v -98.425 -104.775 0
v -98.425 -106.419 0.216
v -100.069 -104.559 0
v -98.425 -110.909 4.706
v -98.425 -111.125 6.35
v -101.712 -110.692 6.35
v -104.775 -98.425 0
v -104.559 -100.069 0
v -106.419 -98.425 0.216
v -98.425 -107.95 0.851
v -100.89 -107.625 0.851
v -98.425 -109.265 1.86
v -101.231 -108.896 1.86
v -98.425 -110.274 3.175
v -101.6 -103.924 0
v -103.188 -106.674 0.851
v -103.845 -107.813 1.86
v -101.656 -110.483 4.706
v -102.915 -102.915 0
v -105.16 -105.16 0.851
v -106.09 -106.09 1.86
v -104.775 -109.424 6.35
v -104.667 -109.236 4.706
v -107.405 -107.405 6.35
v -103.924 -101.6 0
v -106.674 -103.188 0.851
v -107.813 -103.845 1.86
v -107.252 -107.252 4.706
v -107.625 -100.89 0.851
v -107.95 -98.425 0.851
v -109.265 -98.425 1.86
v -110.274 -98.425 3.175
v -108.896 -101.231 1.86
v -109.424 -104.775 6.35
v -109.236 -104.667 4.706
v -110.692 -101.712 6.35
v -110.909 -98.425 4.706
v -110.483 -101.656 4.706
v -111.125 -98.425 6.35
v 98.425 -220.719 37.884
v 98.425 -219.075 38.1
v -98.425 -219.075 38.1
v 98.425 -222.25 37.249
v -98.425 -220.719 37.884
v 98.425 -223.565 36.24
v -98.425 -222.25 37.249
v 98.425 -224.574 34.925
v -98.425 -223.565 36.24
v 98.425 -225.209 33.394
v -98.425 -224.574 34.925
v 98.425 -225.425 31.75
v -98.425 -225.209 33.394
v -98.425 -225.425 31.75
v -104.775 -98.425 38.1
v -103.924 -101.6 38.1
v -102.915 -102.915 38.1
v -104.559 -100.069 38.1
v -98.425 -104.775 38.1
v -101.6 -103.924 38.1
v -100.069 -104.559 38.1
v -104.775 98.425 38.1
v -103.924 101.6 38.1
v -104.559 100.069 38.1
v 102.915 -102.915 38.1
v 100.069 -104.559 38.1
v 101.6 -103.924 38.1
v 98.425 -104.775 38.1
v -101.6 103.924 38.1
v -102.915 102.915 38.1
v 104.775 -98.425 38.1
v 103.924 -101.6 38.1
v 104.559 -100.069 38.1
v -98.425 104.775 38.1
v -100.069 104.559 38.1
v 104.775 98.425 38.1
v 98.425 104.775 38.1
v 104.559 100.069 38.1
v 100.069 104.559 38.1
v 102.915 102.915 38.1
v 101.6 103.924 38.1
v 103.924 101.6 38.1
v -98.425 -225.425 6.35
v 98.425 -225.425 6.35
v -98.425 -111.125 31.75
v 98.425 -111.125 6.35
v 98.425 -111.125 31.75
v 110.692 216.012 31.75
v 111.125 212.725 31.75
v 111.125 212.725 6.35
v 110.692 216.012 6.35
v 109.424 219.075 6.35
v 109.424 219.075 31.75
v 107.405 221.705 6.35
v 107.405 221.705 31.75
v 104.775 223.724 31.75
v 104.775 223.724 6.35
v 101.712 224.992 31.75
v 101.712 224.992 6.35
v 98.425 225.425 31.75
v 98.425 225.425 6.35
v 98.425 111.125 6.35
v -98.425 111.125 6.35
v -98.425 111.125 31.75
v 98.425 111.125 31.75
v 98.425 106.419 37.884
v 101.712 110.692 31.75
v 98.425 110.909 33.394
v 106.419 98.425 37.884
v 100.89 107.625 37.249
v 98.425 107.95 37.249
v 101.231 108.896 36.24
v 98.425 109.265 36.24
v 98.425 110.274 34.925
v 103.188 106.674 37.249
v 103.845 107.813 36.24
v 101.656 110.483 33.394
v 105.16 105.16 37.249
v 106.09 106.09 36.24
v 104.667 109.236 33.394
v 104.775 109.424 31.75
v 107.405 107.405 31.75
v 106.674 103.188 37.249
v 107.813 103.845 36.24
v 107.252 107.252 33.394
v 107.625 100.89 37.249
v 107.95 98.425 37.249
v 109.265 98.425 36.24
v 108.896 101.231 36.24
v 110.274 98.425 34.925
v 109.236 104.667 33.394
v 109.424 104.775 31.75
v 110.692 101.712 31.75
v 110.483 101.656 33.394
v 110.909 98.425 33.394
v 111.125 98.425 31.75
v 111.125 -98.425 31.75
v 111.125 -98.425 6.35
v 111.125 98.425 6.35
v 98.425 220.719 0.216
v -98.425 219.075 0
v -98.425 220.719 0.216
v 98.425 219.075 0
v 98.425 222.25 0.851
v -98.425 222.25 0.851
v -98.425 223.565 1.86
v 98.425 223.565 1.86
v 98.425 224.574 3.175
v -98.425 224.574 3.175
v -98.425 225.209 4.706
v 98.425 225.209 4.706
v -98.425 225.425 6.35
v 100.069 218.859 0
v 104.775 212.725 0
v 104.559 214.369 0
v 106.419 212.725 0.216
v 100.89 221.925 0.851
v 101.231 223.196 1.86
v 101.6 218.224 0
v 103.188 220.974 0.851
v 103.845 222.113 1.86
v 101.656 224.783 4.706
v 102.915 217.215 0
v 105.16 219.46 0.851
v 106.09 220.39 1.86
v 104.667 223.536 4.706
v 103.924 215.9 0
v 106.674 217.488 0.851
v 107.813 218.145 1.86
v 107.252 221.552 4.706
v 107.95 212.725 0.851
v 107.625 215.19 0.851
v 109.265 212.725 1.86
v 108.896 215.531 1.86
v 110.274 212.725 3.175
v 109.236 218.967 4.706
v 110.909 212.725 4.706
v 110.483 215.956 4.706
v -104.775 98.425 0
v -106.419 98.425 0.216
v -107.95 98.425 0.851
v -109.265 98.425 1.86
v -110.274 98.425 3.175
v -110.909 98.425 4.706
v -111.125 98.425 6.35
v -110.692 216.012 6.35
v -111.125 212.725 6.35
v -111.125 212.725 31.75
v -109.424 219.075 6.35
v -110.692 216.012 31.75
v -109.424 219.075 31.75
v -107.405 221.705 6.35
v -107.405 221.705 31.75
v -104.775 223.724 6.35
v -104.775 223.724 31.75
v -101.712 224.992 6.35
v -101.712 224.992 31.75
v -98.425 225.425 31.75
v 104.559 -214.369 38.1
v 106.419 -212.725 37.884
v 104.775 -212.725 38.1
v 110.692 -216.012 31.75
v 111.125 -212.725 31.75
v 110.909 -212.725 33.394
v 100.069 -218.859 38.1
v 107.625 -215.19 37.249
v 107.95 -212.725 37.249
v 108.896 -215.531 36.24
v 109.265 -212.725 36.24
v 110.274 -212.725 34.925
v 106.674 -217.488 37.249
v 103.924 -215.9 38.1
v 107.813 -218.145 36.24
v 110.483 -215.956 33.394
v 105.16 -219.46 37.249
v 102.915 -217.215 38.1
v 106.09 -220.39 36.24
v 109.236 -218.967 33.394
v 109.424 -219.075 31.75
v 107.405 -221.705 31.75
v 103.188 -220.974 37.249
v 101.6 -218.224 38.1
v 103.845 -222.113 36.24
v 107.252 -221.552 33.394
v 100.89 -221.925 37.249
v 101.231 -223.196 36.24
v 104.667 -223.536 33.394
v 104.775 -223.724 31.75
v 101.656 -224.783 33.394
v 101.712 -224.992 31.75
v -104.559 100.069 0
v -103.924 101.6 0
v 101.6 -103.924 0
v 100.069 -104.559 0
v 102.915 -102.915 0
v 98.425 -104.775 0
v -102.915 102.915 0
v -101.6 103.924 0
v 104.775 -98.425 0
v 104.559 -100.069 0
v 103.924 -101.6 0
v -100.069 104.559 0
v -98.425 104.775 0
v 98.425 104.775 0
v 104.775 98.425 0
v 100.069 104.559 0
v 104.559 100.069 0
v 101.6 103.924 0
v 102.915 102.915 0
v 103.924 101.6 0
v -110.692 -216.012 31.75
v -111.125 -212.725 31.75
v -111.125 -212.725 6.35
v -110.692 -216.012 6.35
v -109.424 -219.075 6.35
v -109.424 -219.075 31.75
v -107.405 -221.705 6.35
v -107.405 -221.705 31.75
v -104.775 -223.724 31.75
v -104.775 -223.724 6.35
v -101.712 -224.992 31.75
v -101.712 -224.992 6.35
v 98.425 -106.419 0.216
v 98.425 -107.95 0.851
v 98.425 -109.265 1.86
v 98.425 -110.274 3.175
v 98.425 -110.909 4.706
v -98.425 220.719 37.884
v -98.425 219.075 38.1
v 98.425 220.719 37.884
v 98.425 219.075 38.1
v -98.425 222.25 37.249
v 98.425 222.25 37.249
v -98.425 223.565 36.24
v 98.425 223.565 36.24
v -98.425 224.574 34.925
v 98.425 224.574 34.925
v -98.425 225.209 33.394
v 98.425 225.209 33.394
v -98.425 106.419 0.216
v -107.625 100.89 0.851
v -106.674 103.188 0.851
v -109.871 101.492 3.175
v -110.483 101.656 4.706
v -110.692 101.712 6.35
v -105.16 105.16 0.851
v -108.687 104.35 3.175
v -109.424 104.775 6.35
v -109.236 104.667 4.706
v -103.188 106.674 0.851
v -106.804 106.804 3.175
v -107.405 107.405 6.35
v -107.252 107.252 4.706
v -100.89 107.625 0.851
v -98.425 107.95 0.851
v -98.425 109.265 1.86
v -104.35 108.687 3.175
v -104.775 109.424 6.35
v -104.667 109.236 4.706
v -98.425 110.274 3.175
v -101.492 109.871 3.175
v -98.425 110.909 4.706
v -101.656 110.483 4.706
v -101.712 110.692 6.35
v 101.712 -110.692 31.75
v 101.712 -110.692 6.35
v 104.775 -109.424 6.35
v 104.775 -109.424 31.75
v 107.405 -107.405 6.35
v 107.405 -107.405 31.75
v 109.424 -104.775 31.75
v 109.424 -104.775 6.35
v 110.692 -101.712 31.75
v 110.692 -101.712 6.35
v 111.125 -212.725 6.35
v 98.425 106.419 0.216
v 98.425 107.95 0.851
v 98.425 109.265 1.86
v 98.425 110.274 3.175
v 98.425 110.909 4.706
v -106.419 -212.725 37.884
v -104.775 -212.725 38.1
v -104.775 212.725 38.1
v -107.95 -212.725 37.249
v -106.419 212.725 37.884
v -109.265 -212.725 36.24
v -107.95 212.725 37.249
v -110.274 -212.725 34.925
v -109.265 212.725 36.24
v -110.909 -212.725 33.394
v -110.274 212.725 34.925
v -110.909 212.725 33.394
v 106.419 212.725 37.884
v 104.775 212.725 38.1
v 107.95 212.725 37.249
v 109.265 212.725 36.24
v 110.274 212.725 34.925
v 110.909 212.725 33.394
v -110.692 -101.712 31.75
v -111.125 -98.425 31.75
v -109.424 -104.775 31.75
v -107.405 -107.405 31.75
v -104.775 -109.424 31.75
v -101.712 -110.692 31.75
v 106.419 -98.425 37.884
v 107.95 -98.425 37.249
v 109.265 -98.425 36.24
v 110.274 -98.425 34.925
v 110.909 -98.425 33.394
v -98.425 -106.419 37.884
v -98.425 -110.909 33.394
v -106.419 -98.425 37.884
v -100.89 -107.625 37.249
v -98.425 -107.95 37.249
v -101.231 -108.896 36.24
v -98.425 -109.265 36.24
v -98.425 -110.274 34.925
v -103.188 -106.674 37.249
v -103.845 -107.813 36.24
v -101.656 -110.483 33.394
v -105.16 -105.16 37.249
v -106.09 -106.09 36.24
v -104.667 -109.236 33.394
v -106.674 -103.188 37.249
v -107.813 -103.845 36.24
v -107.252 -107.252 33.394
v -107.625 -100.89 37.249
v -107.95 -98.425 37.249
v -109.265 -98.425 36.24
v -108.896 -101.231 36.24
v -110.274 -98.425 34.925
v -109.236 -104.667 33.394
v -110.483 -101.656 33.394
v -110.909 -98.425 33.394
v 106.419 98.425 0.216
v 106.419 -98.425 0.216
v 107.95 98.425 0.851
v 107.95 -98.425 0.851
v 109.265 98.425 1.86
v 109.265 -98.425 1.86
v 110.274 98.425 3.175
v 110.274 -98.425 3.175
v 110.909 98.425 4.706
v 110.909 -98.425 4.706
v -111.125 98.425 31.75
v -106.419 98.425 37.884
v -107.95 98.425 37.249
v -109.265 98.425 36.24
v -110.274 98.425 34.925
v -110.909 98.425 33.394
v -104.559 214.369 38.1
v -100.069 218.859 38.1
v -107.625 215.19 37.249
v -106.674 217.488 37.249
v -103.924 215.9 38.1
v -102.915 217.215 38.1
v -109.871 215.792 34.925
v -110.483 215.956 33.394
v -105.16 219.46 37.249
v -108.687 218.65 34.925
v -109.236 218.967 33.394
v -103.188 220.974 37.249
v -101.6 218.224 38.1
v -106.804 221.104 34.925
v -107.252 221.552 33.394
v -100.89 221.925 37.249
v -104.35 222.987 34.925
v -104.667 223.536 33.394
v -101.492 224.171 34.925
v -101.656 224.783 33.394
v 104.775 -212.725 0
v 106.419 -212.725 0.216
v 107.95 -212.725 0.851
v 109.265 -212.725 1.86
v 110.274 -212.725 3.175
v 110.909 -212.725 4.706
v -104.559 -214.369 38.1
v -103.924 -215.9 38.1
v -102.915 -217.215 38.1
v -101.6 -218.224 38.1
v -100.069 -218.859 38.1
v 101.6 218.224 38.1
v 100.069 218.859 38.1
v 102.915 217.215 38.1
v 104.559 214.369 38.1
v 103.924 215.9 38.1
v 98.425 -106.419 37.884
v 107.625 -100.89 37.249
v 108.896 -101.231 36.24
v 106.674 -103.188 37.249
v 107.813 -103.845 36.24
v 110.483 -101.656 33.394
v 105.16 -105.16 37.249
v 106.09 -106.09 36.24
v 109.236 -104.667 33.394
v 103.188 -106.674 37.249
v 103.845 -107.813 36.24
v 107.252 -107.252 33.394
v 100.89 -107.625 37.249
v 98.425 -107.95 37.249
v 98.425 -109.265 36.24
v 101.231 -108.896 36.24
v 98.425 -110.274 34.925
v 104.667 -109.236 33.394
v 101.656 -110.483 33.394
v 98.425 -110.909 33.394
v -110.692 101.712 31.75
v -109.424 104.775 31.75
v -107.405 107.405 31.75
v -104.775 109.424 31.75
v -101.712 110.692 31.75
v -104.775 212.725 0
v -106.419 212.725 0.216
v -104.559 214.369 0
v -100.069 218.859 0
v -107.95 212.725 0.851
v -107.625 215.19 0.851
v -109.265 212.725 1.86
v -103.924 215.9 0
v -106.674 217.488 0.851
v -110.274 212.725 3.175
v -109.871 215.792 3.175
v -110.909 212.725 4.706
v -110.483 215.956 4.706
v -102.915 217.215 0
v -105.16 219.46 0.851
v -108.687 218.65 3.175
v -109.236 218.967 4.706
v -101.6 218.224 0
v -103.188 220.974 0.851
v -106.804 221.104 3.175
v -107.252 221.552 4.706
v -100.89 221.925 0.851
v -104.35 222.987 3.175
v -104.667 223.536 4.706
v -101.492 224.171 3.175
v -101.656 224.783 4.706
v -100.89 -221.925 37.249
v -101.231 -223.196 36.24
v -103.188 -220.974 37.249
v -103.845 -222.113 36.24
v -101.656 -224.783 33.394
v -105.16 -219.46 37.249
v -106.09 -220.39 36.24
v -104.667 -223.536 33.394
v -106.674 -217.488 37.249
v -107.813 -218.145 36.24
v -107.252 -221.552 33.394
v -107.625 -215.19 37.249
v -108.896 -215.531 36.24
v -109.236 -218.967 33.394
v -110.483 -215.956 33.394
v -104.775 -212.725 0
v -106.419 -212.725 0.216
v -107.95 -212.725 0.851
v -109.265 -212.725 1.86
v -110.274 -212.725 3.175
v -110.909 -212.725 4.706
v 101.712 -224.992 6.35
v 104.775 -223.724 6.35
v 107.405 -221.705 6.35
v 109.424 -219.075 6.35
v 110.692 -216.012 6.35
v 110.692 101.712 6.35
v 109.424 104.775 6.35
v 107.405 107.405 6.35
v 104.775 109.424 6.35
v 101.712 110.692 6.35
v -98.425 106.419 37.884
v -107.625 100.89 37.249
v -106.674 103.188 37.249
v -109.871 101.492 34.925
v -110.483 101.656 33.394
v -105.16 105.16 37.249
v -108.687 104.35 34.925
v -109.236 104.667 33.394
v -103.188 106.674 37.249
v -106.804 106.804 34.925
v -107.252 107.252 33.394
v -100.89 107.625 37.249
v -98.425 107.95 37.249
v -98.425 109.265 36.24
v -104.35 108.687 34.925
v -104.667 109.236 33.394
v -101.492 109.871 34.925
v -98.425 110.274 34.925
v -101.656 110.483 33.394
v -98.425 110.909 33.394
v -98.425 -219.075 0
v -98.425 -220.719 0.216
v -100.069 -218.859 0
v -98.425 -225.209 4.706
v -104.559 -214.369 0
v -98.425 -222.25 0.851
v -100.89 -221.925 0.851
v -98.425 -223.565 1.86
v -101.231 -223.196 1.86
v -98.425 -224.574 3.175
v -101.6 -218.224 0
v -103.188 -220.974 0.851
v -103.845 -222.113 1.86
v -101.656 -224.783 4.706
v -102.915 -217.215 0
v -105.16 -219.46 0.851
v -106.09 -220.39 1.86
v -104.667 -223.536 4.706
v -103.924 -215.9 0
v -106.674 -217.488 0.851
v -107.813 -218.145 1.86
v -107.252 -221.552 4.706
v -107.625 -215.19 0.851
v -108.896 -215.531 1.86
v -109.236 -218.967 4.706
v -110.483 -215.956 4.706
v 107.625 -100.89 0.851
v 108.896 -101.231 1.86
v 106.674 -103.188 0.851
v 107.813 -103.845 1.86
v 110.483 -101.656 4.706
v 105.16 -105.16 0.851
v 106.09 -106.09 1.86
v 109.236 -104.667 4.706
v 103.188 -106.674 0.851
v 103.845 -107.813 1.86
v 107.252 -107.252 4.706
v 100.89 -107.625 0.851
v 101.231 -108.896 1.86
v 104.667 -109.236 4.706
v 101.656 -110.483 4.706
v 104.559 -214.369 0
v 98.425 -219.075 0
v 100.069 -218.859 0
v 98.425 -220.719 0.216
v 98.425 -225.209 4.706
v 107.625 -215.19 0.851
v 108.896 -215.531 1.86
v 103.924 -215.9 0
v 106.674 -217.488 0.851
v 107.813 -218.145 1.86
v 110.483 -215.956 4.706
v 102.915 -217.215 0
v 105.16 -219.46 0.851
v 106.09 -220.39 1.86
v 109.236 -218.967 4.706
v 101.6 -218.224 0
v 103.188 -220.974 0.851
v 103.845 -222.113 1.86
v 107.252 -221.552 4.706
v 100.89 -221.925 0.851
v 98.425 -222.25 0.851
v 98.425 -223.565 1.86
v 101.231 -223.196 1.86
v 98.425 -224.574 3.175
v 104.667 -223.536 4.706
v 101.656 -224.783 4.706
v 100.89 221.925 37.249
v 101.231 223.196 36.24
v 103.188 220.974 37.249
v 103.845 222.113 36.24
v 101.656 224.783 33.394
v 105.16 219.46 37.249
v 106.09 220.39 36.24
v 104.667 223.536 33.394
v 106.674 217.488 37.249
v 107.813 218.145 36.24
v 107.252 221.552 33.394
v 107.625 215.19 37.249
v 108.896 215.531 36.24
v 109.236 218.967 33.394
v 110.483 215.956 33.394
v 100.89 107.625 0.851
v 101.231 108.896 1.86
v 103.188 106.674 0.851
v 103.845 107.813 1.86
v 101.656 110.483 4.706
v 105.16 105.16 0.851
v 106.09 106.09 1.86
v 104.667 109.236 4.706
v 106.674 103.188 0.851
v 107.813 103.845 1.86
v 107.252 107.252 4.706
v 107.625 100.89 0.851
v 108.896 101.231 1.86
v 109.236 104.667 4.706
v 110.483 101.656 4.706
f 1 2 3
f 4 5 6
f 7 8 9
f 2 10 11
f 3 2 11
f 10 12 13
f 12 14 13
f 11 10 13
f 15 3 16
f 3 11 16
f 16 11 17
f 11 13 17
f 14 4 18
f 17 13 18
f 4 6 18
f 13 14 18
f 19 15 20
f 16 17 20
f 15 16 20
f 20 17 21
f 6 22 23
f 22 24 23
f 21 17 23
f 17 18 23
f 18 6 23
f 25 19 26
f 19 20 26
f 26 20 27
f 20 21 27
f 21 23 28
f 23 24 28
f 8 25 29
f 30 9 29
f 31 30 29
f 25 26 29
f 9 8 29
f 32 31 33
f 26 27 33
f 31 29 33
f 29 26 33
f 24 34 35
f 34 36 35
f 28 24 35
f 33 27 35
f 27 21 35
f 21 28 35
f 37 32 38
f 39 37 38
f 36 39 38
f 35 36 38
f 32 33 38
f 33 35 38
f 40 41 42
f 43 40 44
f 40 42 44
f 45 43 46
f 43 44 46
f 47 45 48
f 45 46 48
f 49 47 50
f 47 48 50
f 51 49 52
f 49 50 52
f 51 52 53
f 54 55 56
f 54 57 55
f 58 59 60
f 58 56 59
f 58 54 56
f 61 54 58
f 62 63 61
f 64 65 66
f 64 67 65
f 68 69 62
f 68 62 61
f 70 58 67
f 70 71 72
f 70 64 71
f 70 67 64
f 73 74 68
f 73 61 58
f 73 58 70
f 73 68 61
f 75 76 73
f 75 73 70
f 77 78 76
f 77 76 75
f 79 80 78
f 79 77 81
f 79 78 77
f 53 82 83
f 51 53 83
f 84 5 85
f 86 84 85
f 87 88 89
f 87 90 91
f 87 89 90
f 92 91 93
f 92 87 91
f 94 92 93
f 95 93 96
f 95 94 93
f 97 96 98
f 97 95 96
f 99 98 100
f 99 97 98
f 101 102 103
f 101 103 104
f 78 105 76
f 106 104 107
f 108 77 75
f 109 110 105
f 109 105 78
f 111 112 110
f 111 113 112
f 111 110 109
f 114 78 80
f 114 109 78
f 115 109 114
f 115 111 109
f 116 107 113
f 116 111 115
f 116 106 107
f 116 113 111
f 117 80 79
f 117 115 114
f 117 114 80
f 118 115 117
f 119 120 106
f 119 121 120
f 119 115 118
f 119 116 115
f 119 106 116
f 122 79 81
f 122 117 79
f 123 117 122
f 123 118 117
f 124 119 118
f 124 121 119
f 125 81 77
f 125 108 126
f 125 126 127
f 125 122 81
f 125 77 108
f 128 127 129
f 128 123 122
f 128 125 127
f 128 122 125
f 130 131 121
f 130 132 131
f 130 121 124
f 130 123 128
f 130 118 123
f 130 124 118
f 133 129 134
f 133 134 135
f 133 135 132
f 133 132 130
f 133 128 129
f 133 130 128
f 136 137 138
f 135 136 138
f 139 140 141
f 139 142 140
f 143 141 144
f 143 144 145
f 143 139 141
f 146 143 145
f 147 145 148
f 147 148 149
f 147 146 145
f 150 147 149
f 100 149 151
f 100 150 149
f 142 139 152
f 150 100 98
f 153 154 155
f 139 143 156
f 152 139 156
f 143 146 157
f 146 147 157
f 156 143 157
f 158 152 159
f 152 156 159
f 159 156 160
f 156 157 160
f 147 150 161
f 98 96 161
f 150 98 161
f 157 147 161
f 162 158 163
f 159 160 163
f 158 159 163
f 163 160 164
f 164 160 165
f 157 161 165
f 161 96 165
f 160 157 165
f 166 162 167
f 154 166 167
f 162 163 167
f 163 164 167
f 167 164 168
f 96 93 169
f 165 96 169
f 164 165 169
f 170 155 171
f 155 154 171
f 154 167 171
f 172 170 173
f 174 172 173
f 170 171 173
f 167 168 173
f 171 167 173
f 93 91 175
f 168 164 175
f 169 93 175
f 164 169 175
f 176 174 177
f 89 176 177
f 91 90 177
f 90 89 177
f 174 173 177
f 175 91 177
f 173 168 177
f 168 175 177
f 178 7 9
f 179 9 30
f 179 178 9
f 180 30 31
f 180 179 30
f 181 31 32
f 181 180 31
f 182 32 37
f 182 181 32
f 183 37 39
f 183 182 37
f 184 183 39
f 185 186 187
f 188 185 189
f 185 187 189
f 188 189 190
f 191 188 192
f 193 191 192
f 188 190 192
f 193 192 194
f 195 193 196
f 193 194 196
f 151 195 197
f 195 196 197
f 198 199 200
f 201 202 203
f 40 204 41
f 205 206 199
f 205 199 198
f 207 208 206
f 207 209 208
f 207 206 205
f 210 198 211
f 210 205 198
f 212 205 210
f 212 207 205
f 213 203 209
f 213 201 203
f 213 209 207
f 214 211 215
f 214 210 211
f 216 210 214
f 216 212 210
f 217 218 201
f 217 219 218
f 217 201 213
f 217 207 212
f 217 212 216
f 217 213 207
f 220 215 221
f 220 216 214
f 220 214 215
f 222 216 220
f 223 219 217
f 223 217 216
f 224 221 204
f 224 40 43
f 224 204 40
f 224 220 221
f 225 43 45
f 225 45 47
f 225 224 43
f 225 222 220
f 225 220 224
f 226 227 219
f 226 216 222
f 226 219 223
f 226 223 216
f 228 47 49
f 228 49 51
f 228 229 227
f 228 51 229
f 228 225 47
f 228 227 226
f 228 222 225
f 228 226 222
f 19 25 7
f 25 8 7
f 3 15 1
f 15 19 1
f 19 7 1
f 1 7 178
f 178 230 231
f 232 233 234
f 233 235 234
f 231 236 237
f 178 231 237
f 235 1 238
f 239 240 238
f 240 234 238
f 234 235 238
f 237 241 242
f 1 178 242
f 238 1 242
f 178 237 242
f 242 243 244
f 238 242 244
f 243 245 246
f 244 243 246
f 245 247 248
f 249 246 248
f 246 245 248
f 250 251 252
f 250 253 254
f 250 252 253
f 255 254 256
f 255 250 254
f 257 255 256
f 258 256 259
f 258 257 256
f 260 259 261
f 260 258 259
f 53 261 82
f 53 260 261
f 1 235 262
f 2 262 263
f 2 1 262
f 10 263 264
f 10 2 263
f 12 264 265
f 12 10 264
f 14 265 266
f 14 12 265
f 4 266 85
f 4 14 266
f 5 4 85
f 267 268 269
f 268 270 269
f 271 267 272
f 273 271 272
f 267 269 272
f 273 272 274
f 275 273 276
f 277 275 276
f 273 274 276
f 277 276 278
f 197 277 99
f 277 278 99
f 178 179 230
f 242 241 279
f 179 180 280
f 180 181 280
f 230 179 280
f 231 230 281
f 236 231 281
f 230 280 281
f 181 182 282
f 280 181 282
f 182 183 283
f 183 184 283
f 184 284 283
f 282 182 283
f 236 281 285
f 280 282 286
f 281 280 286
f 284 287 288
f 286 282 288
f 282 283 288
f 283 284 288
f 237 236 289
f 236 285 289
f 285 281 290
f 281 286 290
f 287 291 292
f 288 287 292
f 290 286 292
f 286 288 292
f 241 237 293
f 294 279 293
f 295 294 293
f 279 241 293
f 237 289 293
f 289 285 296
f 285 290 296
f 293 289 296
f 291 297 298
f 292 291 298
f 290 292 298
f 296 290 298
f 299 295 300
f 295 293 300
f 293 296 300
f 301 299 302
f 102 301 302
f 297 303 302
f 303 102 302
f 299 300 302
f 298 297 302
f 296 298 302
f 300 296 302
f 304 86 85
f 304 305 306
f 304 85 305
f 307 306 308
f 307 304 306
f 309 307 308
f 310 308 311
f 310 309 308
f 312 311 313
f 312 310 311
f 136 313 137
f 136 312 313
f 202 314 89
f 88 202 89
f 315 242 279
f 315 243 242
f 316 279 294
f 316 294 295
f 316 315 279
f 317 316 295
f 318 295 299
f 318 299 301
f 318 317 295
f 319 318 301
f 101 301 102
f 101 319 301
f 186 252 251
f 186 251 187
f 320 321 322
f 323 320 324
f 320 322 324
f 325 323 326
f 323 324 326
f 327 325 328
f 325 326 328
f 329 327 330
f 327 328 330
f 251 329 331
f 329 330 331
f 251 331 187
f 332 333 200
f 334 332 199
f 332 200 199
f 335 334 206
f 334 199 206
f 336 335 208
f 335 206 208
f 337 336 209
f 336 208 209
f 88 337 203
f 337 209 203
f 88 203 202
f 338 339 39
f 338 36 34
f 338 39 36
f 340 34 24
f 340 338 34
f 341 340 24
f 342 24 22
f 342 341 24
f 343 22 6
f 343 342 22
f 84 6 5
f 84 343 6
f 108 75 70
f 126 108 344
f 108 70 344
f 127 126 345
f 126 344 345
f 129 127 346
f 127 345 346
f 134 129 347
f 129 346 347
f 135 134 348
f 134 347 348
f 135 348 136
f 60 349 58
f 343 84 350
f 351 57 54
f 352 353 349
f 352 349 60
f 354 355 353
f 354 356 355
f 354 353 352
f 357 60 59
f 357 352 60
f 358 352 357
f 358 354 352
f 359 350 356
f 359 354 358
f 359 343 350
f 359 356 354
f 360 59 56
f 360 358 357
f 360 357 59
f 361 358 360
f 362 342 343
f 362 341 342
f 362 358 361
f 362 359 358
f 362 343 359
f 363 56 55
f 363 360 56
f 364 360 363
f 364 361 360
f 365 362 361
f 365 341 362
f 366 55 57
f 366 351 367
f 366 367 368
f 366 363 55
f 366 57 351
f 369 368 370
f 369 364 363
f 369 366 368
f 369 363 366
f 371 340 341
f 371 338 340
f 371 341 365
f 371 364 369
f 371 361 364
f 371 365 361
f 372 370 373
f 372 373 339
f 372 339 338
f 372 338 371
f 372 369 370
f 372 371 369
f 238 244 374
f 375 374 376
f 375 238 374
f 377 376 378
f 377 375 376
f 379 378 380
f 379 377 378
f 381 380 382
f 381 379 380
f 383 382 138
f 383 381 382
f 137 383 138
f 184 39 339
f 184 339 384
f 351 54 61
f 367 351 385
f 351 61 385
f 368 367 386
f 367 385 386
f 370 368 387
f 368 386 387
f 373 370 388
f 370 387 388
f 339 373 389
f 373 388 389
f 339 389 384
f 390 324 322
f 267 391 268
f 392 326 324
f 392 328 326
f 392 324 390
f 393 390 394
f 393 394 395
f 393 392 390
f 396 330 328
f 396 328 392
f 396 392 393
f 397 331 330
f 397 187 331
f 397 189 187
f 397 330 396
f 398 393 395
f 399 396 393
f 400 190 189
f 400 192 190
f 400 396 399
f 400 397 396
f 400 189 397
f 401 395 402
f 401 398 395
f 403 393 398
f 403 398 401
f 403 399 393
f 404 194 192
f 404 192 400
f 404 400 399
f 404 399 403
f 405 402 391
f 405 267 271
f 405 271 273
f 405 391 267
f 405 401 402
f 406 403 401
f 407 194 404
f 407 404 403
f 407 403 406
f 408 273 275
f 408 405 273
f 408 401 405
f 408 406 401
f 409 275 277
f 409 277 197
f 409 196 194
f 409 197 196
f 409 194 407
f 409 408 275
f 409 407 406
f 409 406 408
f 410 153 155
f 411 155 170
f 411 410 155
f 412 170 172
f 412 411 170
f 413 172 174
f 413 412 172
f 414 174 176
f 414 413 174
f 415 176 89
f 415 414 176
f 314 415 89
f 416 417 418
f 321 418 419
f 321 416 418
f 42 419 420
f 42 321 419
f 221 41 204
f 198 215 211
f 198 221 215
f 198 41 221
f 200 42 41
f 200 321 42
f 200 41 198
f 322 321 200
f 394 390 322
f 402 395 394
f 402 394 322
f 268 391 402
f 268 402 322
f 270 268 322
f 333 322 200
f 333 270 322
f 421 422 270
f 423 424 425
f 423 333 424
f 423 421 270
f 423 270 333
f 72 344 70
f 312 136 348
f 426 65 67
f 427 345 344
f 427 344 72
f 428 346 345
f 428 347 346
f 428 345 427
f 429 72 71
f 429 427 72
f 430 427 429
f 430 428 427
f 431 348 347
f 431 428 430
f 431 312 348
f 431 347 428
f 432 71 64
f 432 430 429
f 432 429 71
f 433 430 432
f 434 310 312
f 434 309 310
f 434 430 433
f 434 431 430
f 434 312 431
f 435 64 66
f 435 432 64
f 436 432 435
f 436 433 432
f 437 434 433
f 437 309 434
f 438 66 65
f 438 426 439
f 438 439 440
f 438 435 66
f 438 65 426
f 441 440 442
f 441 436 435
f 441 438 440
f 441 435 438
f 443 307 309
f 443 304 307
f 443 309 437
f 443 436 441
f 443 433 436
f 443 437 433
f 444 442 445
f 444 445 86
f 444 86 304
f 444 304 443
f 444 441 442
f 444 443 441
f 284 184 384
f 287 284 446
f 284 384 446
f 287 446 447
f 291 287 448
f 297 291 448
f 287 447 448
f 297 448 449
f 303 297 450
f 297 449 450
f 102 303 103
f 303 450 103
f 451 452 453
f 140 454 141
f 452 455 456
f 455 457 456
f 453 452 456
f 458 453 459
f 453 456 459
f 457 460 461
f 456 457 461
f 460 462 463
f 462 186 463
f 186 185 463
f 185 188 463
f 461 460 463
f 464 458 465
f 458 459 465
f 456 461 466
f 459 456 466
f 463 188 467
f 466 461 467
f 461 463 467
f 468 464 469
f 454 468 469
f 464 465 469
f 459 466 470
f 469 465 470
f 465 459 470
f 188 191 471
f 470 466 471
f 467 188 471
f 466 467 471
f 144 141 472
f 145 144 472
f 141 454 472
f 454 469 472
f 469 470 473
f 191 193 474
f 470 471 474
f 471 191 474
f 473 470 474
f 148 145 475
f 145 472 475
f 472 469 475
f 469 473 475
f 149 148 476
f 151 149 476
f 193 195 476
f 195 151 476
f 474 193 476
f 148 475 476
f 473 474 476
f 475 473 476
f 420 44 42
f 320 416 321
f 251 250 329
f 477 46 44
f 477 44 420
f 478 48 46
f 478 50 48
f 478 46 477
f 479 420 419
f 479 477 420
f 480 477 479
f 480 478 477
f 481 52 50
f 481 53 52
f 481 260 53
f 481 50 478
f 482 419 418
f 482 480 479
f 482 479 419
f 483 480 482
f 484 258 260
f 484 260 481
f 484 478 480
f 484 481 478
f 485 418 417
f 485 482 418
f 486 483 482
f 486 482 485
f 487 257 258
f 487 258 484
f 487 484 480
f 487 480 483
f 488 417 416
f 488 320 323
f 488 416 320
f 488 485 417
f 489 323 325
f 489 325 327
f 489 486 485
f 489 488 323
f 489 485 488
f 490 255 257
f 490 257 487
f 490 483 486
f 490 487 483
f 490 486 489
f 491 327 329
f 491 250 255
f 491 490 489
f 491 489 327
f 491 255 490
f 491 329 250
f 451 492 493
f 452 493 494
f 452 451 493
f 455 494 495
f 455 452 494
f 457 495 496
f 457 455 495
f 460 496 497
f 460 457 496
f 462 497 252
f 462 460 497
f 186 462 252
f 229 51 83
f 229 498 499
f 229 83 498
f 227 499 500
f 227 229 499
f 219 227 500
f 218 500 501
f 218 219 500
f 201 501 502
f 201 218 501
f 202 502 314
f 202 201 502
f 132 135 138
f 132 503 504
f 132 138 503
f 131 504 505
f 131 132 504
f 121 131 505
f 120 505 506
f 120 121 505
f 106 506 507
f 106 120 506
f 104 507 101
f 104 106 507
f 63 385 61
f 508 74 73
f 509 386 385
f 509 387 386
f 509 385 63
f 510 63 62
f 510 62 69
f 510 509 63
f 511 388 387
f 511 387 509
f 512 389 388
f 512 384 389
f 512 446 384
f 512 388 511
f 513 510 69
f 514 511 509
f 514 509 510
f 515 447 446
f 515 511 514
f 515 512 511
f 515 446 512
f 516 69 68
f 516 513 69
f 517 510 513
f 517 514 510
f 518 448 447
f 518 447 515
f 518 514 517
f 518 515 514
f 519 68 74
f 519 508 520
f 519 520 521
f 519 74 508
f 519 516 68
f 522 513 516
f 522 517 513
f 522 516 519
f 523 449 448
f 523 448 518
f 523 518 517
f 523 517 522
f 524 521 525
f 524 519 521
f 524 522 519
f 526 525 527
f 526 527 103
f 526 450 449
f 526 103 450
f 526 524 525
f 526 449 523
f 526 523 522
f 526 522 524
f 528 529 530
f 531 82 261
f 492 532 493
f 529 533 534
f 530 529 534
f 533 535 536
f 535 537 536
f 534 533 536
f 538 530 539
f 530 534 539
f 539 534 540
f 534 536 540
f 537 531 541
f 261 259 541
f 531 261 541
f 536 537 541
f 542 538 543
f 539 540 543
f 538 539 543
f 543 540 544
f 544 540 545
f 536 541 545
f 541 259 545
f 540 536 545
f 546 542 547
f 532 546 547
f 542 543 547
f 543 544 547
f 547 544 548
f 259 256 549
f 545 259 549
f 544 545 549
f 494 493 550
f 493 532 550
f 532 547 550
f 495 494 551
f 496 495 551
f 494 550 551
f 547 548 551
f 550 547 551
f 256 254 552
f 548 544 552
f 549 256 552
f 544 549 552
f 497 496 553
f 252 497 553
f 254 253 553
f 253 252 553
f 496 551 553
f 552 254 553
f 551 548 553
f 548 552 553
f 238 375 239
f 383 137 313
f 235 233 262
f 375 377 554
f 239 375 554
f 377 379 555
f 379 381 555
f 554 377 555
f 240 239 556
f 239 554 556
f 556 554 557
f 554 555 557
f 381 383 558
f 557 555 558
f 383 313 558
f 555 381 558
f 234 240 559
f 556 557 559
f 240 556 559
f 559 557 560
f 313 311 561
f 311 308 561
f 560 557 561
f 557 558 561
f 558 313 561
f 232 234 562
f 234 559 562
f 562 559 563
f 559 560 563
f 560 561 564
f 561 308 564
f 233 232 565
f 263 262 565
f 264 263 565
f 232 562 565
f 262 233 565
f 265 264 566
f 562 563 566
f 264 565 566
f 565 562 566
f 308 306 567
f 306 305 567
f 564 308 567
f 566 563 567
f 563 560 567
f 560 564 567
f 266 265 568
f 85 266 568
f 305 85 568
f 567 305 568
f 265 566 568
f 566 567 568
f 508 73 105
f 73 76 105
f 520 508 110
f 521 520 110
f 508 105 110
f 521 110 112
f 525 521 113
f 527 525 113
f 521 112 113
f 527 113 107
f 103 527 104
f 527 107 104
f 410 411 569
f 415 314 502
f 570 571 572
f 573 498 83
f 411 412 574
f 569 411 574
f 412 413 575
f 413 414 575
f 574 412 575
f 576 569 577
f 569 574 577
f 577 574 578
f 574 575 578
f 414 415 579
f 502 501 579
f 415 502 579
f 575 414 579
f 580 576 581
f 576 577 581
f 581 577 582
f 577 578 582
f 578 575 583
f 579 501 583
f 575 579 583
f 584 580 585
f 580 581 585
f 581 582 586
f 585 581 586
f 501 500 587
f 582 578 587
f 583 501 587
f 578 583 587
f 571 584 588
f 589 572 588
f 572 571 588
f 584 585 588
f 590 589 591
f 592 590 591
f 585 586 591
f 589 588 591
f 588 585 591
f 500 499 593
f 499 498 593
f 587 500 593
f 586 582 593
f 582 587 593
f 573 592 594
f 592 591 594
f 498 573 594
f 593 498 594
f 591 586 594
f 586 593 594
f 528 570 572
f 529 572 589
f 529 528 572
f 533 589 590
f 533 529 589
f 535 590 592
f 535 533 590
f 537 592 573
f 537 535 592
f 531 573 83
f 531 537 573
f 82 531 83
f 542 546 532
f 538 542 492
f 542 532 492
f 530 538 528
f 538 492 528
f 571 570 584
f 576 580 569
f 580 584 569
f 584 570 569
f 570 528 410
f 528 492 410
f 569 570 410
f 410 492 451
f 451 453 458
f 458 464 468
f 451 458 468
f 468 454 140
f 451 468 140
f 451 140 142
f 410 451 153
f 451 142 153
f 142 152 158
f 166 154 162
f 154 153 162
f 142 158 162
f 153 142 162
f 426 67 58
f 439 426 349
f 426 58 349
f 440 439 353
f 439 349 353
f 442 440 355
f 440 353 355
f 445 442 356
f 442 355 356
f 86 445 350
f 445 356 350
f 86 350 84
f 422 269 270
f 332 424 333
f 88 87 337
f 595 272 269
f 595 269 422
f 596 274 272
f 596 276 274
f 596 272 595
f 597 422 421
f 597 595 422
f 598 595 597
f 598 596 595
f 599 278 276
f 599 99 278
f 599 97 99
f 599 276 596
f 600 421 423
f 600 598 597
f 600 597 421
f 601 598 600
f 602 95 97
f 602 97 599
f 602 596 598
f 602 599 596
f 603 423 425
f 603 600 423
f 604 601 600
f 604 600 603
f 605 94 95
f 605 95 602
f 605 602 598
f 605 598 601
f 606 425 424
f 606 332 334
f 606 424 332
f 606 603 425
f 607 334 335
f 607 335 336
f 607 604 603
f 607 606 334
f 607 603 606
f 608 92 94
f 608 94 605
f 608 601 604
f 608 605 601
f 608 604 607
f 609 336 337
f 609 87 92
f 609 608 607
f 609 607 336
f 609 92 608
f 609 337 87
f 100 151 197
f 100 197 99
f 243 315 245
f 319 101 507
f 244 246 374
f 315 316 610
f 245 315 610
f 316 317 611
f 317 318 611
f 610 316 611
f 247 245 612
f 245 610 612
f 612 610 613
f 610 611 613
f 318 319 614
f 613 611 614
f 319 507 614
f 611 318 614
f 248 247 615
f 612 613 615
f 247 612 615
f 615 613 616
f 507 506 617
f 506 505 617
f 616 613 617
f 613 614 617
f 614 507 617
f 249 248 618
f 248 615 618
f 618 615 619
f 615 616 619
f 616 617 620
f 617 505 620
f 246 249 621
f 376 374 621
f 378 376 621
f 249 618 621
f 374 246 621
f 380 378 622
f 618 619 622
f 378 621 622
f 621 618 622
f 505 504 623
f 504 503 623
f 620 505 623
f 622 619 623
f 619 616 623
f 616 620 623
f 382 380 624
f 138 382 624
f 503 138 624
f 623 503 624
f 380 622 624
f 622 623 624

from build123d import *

# Parameters (mm, degrees)
F0_W     = 222.25
F0_H     = 222.25
F2_DEPTH = 38.1
F3_R     = 12.7
F4_R     = 6.35
F1_W     = 222.25
F1_H     = 450.85
F5_DEPTH = 38.1
F6_R     = 12.7
F7_R     = 6.35


with BuildPart() as f2:
    # F0 (on Top) → F2 (new body)
    with BuildSketch(Plane.XY):
        Rectangle(F0_W, F0_H)
    extrude(amount=F2_DEPTH)

    # F3
    f3_edges = [f2.edges().sort_by_distance(p)[0] for p in [
        (-111.125, -111.125, 19.05),
        (111.125, -111.125, 19.05),
        (111.125, 111.125, 19.05),
        (-111.125, 111.125, 19.05),
    ]]
    fillet(f3_edges, radius=F3_R)

    # F4
    f4_edges = [f2.edges().sort_by_distance(p)[0] for p in [
        (0, 111.125, 38.1),
        (107.405256, 107.405256, 38.1),
        (-107.405256, 107.405256, 38.1),
        (111.125, 0, 38.1),
        (-111.125, 0, 38.1),
        (107.405256, -107.405256, 38.1),
        (-107.405256, -107.405256, 38.1),
        (0, -111.125, 38.1),
        (0, 111.125, 0),
        (107.405256, 107.405256, 0),
        (-107.405256, 107.405256, 0),
        (111.125, 0, 0),
        (-111.125, 0, 0),
        (107.405256, -107.405256, 0),
        (-107.405256, -107.405256, 0),
        (0, -111.125, 0),
    ]]
    fillet(f4_edges, radius=F4_R)


with BuildPart() as f5:
    # F1 (on Top) → F5 (new body)
    with BuildSketch(Plane.XY):
        Rectangle(F1_W, F1_H)
    extrude(amount=F5_DEPTH)

    # F6
    f6_edges = [f5.edges().sort_by_distance(p)[0] for p in [
        (-111.125, -225.425, 19.05),
        (111.125, -225.425, 19.05),
        (111.125, 225.425, 19.05),
        (-111.125, 225.425, 19.05),
    ]]
    fillet(f6_edges, radius=F6_R)

    # F7
    f7_edges = [f5.edges().sort_by_distance(p)[0] for p in [
        (0, 225.425, 38.1),
        (107.405256, 221.705256, 38.1),
        (-107.405256, 221.705256, 38.1),
        (111.125, 0, 38.1),
        (-111.125, 0, 38.1),
        (107.405256, -221.705256, 38.1),
        (-107.405256, -221.705256, 38.1),
        (0, -225.425, 38.1),
        (0, 225.425, 0),
        (107.405256, 221.705256, 0),
        (-107.405256, 221.705256, 0),
        (111.125, 0, 0),
        (-111.125, 0, 0),
        (107.405256, -221.705256, 0),
        (-107.405256, -221.705256, 0),
        (0, -225.425, 0),
    ]]
    fillet(f7_edges, radius=F7_R)


solid = Compound([f2.part, f5.part])
